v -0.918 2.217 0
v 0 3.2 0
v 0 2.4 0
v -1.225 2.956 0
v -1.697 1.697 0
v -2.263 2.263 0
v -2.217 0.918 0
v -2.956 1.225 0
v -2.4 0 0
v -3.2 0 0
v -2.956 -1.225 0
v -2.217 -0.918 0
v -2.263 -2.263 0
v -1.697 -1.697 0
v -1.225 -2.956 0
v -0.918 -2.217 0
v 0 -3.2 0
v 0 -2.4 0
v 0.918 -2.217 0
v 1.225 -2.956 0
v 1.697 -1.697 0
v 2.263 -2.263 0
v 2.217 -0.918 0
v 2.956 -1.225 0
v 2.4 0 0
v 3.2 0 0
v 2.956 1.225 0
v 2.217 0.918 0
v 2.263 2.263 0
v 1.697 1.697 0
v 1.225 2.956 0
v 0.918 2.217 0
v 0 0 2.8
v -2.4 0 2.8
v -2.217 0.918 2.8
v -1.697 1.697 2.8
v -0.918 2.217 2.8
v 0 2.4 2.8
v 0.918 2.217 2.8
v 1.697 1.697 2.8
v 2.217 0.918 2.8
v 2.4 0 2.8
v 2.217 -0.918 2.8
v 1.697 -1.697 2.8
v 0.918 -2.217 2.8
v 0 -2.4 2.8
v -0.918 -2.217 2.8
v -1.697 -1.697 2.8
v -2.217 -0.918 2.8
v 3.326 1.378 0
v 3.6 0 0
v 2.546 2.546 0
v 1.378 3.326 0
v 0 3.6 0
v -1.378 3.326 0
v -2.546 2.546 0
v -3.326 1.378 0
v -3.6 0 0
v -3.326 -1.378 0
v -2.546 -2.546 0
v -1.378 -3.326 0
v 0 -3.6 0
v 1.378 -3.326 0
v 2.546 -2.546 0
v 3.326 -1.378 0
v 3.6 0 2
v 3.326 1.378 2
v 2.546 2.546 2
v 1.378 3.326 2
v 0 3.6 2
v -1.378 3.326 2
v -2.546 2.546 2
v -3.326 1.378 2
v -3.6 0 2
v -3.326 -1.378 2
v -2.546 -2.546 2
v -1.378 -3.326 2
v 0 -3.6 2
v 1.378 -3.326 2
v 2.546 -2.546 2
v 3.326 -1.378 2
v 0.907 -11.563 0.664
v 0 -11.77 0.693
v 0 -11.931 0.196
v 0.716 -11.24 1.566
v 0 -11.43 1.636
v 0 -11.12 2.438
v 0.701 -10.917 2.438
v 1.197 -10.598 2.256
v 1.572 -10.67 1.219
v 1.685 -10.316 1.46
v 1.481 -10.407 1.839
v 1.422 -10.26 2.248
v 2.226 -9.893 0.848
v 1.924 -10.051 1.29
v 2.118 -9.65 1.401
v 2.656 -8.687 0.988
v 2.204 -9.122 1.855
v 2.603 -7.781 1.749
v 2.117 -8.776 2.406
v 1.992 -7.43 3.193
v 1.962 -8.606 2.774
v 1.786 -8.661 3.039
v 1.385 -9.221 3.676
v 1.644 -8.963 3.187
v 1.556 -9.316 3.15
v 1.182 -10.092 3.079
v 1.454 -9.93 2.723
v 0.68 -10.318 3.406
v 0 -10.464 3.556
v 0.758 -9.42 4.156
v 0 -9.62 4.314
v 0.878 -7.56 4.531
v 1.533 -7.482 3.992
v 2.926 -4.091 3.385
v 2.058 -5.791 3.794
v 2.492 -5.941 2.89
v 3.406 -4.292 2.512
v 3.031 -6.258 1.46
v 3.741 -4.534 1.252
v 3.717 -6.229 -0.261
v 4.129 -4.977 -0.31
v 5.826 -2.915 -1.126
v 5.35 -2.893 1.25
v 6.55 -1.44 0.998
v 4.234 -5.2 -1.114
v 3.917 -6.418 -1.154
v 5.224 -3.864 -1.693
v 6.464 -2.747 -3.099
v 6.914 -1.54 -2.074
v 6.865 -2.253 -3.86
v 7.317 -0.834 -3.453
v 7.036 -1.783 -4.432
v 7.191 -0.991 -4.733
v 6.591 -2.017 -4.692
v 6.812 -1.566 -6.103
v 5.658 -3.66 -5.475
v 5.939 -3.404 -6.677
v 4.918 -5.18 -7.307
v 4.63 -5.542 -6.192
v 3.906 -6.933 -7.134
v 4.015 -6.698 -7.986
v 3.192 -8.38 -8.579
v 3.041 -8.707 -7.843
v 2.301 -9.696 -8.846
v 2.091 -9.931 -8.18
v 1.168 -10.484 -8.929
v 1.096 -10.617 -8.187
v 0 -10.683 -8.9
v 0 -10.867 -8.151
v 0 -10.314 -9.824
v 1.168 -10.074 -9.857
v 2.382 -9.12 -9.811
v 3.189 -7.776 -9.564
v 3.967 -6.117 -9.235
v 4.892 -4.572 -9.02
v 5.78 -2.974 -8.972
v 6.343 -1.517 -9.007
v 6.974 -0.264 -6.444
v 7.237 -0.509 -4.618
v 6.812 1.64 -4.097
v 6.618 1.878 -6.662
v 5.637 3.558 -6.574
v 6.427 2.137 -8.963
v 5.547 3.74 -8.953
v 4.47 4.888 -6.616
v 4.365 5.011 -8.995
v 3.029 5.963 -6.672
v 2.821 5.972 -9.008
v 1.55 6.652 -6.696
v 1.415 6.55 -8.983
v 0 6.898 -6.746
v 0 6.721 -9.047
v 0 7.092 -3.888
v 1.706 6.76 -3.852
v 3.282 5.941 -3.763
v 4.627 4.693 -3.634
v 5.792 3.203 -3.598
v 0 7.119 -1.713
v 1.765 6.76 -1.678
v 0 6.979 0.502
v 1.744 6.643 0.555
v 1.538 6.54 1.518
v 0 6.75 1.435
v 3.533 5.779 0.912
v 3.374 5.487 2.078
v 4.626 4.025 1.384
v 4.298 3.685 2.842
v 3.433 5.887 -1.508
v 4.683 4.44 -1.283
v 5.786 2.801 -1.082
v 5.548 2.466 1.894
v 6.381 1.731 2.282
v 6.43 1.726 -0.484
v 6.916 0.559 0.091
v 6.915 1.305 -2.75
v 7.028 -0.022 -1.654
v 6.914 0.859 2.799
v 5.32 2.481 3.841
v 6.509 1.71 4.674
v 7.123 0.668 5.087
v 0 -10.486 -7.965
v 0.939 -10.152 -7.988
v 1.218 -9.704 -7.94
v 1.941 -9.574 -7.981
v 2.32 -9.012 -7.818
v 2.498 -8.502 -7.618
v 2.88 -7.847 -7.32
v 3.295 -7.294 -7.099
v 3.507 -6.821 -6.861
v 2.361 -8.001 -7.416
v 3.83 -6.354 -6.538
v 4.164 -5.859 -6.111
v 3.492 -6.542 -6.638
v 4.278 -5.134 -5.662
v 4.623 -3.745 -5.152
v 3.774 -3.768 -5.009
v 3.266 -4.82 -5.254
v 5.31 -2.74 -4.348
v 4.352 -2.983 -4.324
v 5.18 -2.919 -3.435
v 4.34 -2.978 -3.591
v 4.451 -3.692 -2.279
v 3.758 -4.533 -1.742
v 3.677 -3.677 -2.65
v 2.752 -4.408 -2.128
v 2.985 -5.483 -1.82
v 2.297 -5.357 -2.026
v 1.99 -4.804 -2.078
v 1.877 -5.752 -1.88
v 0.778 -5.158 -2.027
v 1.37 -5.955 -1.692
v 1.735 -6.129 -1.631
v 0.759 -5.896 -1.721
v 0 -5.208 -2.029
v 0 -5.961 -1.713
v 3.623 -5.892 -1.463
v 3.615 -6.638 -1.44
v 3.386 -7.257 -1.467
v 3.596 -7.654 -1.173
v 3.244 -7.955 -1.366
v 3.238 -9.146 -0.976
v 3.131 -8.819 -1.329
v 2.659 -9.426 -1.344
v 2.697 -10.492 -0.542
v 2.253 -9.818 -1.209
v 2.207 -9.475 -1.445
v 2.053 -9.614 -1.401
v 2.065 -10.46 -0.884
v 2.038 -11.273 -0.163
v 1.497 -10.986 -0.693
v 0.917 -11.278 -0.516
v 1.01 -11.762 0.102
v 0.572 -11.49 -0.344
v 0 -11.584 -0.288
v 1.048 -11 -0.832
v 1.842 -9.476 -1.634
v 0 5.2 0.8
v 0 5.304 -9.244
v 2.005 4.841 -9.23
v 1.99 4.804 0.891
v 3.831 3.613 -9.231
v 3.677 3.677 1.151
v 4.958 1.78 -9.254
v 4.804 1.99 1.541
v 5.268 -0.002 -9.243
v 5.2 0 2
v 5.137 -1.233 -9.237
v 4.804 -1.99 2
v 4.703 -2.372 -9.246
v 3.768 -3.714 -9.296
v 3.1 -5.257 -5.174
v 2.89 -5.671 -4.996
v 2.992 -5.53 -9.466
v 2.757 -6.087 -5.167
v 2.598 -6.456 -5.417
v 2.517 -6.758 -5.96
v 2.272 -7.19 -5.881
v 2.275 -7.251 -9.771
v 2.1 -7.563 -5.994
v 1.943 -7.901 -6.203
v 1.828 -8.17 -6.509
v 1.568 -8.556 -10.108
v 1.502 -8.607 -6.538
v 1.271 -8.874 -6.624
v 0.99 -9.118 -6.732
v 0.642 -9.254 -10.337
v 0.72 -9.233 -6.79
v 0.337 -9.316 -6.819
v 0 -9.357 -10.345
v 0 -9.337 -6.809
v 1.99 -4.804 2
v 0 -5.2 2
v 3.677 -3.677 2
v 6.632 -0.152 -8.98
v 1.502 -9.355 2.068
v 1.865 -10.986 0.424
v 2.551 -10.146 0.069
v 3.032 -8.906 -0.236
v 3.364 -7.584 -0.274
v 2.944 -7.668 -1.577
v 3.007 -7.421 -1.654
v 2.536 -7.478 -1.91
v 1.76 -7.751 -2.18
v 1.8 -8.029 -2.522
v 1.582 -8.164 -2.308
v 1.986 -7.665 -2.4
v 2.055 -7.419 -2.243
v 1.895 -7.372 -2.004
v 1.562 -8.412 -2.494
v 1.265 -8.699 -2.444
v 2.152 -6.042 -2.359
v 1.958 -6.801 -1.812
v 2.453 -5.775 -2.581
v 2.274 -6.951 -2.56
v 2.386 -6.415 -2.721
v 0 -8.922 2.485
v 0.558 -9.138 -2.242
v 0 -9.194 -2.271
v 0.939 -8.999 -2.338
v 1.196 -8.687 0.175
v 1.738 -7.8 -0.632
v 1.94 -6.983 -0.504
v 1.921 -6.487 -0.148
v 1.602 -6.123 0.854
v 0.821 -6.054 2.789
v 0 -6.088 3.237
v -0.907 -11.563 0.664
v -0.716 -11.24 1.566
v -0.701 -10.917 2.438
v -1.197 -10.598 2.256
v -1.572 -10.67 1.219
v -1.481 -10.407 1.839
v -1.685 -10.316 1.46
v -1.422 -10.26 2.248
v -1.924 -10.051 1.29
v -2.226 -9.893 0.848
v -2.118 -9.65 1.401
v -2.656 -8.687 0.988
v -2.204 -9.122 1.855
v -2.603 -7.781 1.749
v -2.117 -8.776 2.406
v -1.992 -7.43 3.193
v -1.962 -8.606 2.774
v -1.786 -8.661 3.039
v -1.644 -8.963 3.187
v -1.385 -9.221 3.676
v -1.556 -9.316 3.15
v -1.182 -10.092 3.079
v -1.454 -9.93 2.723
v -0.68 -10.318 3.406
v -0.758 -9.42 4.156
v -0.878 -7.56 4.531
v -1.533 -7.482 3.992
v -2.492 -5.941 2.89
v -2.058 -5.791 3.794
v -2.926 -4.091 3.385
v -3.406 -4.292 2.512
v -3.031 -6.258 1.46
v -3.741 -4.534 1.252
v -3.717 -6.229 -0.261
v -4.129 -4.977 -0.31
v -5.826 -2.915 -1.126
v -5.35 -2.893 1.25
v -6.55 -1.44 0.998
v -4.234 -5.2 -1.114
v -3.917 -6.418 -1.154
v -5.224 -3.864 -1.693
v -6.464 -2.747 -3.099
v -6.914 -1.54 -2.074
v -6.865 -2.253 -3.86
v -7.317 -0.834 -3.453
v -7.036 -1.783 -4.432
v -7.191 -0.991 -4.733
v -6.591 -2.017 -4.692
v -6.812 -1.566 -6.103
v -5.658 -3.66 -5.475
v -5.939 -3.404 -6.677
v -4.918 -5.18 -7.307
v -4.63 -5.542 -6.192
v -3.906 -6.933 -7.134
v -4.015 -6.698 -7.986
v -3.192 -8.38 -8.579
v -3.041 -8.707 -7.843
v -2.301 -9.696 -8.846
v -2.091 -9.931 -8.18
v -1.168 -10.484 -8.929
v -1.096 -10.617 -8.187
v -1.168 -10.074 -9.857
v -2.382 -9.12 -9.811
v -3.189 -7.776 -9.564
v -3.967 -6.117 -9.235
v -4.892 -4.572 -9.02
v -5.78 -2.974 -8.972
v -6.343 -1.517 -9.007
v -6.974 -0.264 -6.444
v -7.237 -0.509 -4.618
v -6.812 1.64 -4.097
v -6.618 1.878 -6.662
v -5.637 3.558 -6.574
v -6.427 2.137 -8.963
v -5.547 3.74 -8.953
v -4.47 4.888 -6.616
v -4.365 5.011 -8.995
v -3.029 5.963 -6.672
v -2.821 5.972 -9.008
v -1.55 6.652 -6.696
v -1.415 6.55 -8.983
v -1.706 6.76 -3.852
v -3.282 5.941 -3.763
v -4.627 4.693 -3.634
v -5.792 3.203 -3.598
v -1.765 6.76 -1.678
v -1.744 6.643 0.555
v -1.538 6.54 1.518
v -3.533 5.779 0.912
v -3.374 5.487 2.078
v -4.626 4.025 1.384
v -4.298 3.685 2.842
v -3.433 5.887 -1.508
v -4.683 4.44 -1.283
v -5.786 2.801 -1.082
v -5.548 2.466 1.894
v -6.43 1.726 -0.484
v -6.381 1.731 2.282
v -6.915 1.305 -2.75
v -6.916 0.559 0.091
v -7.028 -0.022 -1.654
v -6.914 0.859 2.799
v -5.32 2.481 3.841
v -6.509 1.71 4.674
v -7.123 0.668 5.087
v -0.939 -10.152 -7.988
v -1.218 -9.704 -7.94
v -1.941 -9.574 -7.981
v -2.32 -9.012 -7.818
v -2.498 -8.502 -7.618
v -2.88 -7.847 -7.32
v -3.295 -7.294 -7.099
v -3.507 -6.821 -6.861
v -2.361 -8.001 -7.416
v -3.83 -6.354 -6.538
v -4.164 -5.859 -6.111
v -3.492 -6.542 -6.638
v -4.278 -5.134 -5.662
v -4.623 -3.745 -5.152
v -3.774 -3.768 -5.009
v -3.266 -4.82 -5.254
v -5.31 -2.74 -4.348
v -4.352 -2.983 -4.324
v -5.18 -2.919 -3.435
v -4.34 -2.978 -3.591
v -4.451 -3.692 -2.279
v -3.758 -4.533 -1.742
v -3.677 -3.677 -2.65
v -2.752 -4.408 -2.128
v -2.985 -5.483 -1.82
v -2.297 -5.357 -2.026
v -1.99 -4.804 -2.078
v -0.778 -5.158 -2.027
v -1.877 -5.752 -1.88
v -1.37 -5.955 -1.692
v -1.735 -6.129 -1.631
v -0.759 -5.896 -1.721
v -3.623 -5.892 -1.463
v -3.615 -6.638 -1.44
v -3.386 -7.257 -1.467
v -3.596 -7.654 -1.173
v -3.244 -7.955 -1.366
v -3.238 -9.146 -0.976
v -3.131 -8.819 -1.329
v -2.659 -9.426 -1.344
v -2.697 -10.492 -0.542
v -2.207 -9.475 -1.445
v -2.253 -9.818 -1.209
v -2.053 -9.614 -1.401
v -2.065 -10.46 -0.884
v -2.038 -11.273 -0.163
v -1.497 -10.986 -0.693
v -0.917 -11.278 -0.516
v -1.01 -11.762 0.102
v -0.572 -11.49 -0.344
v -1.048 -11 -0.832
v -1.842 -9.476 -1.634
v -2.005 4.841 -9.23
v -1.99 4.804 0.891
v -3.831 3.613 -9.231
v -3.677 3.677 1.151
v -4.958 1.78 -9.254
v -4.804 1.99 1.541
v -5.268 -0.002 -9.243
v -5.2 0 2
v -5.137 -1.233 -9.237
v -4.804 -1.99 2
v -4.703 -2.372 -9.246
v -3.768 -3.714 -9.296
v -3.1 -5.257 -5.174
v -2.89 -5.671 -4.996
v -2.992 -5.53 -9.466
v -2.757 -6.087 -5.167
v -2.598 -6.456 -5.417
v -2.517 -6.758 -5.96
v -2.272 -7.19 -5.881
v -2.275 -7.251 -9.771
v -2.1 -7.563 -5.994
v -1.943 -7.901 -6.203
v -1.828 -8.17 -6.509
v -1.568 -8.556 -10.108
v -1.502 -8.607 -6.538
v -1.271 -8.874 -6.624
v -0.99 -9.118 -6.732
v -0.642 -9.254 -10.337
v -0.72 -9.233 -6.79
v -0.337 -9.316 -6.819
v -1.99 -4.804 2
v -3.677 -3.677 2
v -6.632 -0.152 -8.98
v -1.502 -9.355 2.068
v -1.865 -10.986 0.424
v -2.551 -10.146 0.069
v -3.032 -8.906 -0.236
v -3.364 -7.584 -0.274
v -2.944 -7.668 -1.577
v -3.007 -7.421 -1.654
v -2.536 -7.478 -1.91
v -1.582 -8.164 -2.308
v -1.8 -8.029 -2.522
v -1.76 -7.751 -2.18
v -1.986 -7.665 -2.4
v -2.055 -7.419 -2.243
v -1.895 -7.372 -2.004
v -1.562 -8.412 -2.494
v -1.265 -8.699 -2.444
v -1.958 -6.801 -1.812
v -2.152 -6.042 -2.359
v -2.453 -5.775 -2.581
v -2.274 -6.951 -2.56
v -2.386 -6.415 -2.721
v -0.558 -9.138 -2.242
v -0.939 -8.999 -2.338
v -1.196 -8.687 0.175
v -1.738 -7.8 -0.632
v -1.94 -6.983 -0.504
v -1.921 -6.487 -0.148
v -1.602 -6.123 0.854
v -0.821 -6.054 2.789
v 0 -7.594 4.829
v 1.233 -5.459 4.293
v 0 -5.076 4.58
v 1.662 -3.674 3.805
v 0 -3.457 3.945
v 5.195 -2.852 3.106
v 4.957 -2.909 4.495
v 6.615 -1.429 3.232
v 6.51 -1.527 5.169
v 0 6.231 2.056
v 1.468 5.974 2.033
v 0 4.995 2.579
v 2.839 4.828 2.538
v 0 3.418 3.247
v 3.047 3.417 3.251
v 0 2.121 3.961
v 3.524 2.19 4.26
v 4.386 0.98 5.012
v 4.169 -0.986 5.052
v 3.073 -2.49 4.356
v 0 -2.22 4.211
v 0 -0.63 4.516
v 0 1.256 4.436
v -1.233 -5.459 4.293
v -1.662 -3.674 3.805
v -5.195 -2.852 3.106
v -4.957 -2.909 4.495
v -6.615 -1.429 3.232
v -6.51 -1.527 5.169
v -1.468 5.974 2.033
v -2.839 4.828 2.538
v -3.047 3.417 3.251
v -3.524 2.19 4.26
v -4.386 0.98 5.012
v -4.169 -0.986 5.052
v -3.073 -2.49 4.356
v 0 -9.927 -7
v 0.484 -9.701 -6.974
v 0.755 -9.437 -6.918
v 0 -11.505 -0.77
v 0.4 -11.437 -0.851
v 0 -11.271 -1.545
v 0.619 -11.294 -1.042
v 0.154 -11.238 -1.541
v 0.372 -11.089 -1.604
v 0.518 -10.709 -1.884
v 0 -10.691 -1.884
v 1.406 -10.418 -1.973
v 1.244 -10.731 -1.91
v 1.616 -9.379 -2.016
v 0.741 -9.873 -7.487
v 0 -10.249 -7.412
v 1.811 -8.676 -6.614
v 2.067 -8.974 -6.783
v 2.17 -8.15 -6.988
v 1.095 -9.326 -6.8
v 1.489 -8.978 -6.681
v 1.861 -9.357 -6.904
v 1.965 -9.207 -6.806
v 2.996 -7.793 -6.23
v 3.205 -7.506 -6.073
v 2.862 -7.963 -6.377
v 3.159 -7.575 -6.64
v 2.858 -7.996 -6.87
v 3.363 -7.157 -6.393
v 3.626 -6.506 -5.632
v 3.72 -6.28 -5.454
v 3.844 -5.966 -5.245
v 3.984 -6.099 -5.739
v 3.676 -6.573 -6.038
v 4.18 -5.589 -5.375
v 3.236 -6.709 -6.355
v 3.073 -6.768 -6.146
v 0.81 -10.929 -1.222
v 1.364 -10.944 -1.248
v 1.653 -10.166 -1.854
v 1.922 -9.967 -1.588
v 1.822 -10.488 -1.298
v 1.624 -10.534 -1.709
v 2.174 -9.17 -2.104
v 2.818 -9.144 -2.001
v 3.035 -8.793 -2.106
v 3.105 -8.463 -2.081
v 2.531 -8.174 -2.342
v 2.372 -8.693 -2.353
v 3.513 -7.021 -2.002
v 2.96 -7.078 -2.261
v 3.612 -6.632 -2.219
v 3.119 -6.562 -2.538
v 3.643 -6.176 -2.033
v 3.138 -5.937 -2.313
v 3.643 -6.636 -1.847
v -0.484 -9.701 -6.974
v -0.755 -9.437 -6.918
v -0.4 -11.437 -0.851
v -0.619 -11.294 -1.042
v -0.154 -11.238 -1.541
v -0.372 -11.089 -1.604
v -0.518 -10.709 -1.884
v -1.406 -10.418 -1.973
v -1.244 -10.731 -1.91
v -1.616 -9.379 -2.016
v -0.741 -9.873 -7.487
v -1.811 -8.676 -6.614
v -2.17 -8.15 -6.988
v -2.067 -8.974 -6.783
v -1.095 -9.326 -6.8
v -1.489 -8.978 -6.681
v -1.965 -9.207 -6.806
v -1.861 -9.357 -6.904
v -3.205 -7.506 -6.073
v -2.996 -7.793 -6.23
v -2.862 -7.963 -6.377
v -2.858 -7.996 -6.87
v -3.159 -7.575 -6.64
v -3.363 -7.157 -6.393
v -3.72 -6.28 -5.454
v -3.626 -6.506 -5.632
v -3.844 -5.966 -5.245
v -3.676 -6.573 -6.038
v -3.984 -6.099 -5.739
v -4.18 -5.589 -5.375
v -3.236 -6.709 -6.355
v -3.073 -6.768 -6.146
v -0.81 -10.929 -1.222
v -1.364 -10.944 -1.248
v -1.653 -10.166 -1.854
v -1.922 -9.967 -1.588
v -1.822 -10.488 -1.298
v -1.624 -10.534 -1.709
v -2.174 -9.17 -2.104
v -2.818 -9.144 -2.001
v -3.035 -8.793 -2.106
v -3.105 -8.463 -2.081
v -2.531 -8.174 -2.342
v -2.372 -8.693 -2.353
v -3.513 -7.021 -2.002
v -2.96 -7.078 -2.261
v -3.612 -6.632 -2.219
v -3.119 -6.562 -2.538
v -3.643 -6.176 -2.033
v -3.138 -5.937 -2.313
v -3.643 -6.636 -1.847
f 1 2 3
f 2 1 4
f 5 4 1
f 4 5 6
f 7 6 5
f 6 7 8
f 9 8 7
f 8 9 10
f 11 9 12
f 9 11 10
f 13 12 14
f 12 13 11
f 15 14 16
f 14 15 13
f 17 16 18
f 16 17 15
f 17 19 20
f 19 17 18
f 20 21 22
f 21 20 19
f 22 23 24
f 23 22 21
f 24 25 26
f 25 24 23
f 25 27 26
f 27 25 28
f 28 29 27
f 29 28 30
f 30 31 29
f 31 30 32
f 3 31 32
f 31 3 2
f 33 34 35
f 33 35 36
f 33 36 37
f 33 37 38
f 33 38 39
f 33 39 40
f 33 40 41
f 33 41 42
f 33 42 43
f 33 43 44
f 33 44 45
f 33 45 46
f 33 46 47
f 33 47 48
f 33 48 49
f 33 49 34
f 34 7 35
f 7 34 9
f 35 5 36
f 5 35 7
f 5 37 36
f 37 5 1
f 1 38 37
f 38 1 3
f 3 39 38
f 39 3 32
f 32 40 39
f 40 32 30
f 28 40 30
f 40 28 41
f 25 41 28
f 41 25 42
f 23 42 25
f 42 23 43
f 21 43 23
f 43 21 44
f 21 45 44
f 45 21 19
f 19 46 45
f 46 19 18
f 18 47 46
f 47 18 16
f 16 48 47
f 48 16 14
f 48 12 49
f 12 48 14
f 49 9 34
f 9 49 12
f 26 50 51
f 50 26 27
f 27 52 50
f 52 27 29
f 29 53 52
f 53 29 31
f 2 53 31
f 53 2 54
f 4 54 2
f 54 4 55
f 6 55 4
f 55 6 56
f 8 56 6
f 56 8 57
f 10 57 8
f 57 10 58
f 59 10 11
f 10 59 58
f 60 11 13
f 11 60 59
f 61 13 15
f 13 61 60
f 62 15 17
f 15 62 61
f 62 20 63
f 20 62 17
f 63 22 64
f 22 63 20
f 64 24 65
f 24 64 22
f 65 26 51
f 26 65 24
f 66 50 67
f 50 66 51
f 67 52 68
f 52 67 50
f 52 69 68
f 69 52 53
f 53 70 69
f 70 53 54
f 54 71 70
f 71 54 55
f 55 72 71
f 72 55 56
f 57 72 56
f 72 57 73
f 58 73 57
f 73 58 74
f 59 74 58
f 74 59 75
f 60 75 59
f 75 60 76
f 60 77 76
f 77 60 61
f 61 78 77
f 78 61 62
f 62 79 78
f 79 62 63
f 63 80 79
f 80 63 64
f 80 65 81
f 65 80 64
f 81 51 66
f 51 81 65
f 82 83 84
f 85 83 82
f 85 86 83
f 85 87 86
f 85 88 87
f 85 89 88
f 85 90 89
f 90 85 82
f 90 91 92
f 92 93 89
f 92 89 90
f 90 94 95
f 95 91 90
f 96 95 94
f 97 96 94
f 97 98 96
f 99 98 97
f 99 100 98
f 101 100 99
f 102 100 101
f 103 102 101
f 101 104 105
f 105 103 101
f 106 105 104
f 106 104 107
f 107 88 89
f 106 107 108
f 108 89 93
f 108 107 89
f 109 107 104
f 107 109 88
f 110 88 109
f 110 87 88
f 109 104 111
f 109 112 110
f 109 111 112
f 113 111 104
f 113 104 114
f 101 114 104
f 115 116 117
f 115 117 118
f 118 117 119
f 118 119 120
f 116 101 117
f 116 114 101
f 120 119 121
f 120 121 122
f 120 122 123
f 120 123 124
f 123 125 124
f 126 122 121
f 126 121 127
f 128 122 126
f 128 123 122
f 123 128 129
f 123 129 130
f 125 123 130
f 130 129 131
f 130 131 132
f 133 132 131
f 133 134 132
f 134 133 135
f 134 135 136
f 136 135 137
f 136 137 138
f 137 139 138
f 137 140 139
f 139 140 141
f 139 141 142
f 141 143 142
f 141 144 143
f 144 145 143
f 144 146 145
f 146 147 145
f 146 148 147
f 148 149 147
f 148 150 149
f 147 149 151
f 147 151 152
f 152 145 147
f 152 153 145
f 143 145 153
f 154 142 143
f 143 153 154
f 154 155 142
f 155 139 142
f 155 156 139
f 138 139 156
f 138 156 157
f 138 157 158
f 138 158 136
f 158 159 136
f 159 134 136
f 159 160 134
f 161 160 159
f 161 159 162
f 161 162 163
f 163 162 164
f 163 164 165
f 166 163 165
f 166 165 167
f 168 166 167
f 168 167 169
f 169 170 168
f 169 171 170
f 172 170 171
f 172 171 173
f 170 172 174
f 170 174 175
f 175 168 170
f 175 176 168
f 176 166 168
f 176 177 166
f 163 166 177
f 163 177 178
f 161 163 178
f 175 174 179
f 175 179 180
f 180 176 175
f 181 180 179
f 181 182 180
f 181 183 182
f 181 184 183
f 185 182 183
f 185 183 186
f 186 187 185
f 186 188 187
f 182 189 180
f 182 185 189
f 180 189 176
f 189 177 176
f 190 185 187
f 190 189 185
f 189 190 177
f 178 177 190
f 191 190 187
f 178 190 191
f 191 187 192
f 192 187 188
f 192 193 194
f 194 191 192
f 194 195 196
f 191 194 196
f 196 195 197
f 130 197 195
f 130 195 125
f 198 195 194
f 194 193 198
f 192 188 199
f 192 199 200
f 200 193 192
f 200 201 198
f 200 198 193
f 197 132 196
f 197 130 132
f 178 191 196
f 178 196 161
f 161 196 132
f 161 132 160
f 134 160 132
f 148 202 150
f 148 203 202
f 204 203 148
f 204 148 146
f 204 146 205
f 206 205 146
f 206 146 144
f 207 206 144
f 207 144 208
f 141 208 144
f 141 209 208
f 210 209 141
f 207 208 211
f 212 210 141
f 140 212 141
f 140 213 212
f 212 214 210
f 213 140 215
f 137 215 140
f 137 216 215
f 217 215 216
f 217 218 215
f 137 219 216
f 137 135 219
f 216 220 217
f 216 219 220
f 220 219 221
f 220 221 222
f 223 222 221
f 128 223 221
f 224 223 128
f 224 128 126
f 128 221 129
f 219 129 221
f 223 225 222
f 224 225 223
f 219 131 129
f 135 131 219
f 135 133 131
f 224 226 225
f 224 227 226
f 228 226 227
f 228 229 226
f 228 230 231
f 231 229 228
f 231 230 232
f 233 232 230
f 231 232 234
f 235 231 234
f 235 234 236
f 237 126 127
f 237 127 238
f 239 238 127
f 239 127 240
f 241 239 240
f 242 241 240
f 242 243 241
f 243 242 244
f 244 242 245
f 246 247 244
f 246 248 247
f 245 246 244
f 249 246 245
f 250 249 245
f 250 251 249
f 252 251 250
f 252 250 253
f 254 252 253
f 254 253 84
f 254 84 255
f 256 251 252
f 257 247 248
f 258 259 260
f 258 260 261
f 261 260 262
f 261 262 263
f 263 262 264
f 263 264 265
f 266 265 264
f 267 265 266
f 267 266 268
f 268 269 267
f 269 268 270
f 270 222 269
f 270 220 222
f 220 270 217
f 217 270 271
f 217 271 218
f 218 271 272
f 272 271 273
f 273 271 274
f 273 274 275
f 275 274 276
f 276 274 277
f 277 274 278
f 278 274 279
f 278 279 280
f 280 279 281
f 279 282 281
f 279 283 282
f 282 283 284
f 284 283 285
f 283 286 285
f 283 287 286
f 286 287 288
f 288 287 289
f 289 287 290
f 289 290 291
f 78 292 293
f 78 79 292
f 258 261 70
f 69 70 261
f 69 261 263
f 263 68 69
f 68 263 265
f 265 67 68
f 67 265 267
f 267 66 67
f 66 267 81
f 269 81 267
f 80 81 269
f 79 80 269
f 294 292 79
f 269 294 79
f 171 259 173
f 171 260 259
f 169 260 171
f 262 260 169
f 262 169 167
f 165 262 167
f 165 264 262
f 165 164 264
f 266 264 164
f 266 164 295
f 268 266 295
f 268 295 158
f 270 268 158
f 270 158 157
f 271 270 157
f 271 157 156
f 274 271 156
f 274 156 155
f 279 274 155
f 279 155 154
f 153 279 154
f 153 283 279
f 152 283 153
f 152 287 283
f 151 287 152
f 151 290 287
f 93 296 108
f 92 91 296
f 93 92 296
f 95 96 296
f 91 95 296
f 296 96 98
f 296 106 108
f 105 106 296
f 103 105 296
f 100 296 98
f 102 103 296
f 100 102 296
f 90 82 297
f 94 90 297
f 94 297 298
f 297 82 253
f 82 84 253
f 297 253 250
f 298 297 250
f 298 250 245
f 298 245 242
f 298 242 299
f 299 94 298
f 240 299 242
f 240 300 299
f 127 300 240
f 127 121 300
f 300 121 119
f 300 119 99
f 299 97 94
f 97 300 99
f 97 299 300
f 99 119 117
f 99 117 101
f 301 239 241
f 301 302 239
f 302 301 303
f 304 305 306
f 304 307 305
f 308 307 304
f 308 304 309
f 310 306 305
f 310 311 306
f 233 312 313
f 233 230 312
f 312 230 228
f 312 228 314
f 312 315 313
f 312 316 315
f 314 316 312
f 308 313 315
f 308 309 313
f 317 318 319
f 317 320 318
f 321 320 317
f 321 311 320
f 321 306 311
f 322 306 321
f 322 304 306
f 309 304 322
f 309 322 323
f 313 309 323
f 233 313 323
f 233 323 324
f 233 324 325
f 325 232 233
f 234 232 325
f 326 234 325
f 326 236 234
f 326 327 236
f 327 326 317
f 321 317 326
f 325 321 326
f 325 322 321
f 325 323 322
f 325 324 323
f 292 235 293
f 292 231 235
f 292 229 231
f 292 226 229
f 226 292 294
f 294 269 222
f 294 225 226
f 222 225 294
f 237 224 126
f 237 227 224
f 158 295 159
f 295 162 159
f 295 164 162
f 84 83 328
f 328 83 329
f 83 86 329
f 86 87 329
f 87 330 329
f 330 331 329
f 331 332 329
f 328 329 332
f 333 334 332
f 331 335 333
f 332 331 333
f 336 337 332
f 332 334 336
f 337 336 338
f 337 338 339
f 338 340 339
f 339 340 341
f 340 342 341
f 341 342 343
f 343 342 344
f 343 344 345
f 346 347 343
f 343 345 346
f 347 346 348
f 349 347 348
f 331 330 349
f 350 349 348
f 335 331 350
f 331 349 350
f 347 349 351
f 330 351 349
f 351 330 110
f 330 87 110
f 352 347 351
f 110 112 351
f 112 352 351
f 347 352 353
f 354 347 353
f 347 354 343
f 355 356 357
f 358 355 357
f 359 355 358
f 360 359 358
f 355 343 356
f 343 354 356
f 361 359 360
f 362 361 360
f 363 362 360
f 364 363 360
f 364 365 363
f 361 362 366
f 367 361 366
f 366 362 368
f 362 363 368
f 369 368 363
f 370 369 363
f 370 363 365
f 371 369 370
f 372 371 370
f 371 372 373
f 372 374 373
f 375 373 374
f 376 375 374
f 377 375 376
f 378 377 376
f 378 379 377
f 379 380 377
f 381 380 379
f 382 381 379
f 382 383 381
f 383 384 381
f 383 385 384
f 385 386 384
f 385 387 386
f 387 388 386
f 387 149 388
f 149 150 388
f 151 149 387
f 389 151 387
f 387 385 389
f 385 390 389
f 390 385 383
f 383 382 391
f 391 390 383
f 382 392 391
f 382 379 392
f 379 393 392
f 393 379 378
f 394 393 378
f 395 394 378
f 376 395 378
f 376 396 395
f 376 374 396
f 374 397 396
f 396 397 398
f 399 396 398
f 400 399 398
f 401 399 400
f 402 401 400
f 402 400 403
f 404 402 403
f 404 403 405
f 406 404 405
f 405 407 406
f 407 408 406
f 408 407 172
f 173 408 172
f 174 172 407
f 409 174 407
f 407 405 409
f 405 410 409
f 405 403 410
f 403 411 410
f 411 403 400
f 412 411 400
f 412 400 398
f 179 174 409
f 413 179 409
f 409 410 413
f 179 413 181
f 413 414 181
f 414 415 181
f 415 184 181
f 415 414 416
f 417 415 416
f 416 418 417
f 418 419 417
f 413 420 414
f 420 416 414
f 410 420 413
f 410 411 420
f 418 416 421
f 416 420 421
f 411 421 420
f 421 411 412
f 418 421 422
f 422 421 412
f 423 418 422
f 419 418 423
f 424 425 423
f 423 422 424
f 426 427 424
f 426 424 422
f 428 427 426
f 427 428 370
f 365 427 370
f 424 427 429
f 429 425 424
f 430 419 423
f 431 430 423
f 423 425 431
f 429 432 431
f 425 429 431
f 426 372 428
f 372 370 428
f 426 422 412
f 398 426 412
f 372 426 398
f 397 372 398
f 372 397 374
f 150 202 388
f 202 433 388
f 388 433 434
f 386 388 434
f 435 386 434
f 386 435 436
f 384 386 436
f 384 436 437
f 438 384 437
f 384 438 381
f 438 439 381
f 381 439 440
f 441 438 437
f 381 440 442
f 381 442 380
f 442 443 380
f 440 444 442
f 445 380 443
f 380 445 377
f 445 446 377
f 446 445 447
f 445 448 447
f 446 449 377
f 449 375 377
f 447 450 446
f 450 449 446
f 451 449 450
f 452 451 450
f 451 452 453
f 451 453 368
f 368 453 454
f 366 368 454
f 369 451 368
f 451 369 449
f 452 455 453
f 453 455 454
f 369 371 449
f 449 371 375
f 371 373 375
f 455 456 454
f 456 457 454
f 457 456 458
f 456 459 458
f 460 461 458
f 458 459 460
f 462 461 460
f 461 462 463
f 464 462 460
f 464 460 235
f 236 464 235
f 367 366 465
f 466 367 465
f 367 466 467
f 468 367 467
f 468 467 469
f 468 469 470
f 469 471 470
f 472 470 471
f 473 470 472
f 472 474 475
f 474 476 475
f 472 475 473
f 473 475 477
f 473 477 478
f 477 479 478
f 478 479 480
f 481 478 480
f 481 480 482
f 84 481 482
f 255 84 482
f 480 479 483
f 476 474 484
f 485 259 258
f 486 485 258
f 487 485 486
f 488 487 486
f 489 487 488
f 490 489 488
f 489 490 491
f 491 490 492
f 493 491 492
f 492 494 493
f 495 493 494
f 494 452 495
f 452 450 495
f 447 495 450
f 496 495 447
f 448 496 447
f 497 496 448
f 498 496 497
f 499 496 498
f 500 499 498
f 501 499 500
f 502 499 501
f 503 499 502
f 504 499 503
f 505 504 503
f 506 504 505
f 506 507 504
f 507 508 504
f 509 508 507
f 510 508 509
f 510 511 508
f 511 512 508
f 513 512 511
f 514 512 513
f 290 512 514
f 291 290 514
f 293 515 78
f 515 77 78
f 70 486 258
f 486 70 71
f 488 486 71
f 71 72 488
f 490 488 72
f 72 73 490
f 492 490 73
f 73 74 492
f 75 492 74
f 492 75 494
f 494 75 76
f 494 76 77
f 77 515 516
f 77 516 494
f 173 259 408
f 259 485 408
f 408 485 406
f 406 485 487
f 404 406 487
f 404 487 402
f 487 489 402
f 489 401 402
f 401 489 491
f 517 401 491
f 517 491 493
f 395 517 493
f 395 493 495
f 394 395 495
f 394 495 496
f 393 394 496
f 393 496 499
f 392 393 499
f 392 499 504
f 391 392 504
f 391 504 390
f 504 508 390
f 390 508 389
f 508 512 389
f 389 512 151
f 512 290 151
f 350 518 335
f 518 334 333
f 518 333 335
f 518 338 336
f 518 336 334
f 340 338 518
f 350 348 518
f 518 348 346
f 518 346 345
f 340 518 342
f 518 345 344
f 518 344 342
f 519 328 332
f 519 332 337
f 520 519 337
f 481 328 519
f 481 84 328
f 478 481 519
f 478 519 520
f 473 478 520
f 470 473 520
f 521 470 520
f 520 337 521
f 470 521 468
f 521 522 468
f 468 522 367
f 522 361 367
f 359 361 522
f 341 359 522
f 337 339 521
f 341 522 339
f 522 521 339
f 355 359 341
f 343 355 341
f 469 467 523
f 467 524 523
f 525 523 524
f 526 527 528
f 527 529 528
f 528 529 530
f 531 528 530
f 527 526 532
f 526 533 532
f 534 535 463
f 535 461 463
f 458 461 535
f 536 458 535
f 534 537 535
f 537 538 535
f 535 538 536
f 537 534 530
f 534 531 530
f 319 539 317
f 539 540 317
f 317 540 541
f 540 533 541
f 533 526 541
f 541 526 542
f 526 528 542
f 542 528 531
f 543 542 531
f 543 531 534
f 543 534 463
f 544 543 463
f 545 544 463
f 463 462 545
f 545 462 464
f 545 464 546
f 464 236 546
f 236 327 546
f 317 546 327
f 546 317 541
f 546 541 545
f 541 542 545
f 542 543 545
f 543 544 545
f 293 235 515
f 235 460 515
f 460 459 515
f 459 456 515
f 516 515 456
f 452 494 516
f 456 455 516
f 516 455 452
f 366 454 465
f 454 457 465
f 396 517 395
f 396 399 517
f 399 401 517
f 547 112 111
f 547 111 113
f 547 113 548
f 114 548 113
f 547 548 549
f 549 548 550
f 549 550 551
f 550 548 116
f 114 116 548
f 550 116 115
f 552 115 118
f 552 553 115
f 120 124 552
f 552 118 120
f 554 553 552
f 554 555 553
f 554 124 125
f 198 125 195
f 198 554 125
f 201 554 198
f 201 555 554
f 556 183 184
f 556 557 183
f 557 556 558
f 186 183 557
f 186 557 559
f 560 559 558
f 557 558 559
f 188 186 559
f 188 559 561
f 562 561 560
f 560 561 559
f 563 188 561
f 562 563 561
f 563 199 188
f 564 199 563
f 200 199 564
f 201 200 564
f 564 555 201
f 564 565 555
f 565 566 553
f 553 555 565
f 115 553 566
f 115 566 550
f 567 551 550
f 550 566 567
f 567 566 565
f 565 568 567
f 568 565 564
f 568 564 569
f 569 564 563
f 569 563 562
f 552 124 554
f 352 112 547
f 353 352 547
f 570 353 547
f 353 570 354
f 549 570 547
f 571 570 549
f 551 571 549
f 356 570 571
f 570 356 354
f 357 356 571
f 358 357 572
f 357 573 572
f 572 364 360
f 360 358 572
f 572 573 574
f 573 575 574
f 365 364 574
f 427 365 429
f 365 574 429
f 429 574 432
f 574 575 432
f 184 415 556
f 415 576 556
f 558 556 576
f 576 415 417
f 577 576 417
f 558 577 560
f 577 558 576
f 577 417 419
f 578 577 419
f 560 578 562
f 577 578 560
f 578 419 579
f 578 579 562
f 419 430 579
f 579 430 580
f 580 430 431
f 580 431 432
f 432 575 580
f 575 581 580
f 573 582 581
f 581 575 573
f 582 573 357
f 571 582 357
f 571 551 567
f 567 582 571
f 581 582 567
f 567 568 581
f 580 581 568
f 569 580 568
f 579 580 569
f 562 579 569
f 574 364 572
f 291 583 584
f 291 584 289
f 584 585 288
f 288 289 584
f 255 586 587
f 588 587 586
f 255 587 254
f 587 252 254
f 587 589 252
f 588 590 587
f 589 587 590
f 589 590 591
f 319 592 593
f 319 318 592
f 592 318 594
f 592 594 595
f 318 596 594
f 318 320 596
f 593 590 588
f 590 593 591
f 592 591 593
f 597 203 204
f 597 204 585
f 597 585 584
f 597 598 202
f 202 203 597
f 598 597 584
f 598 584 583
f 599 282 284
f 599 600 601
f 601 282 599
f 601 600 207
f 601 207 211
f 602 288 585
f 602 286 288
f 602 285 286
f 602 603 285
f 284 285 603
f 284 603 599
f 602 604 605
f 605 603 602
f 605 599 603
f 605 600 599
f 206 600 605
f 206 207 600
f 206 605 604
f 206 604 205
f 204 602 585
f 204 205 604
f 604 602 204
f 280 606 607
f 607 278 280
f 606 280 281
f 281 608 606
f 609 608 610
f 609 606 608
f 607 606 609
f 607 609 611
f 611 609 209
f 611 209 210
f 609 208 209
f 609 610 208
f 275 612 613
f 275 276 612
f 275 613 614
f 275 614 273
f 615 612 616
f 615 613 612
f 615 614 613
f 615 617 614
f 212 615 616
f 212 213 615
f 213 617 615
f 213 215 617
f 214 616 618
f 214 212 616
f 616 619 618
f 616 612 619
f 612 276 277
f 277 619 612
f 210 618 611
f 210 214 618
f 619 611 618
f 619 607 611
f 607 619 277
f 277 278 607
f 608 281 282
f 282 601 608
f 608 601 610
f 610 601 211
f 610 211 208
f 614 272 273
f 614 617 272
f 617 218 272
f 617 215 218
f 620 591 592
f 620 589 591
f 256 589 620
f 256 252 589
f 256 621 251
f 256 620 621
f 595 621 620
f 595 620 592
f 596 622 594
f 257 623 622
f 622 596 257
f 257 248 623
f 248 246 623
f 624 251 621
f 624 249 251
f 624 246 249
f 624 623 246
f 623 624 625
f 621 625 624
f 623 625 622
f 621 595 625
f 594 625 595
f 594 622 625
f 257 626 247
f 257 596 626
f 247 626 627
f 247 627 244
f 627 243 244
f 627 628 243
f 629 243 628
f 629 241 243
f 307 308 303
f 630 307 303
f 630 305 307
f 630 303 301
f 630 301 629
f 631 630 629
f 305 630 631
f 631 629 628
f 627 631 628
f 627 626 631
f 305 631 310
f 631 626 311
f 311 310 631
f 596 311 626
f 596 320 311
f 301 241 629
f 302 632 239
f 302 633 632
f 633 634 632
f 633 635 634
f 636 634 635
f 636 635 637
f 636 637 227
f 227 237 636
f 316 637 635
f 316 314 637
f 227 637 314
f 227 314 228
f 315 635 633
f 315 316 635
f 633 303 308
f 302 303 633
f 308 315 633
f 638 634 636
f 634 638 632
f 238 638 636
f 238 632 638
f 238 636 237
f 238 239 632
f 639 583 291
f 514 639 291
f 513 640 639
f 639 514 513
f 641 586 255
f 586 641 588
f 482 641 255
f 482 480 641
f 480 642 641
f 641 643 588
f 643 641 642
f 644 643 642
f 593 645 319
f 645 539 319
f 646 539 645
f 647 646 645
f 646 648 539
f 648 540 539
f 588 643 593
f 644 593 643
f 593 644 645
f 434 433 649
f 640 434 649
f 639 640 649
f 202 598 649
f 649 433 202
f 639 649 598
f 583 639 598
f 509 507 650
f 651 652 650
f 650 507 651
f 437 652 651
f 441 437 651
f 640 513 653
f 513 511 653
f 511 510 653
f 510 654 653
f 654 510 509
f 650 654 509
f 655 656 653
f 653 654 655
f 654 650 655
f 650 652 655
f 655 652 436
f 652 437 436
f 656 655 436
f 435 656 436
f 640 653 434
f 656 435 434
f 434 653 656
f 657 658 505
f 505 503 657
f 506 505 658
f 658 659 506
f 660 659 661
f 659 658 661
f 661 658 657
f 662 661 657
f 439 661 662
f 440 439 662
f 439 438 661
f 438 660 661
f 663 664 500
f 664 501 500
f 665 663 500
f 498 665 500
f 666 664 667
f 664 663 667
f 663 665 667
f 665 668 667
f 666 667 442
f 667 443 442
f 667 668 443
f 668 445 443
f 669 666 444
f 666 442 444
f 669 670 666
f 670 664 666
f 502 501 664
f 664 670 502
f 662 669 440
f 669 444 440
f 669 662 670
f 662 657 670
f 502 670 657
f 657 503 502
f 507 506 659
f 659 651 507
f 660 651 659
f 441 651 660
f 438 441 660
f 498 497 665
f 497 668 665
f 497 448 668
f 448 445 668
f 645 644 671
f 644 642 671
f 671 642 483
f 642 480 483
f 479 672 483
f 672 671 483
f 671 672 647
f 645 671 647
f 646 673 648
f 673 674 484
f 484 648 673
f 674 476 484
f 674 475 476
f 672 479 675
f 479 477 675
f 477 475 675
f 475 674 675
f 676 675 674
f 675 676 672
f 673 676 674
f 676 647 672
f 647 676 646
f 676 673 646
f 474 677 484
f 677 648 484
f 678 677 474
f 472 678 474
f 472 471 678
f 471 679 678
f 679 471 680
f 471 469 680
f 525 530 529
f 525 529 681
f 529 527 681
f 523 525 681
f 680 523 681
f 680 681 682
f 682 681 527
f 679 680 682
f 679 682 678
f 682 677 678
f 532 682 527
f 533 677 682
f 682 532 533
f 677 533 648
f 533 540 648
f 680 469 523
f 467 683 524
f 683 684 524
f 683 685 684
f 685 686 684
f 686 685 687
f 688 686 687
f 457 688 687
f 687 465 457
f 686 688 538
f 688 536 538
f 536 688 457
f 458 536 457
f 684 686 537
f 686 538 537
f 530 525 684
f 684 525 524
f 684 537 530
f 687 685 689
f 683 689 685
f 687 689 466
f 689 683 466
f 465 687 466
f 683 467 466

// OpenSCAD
use <../lib.scad>
use <s/2523s01.scad>
use <s/2523s03.scad>
use <s/2523s04.scad>
function ldraw_lib__2523() = [
// 0 Minifig Headdress T-Rex
// 0 Name: 2523.dat
// 0 Author: Gerald Lasser [GeraldLasser]
// 0 !LDRAW_ORG Part UPDATE 2026-07
// 0 !LICENSE Licensed under CC BY 4.0 : see CAreadme.txt
// 
// 0 BFC CERTIFY CCW
  [0,"BFC","CERTIFY"],
  [0,"BFC","CCW"],
// 
// 0 !CATEGORY Minifig Headwear
// 
// 0 !HISTORY 2023-07-10 {LEGO Instructions App} Original part shape
// 0 !HISTORY 2023-07-10 [GeraldLasser] File preparation for LDraw Parts Tracker
// 0 !HISTORY 2026-07-30 [OrionP] Official Update 2026-07
// 
// 
// 1 16 0 0 0 1 0 0 0 1 0 0 0 1 s\2523s01.dat
  [1,16,0,0,0,1,0,0,0,1,0,0,0,1, ldraw_lib__s__2523s01()],
// 1 16 0 0 0 1 0 0 0 1 0 0 0 1 s\2523s03.dat
  [1,16,0,0,0,1,0,0,0,1,0,0,0,1, ldraw_lib__s__2523s03()],
// 1 16 0 0 0 -1 0 0 0 1 0 0 0 1 s\2523s03.dat
  [1,16,0,0,0,-1,0,0,0,1,0,0,0,1, ldraw_lib__s__2523s03()],
// 1 16 0 0 0 1 0 0 0 1 0 0 0 1 s\2523s04.dat
  [1,16,0,0,0,1,0,0,0,1,0,0,0,1, ldraw_lib__s__2523s04()],
// 1 16 0 0 0 -1 0 0 0 1 0 0 0 1 s\2523s04.dat
  [1,16,0,0,0,-1,0,0,0,1,0,0,0,1, ldraw_lib__s__2523s04()],
];
module ldraw_lib__2523(step=0, col=false, unit=2/5, alt=false, line=0.2, solid=!$preview)
    makepoly(ldraw_lib__2523(), step=step, col=col, unit=unit, alt=alt, line=line, solid=solid);
ldraw_lib__2523(line=0.2);
